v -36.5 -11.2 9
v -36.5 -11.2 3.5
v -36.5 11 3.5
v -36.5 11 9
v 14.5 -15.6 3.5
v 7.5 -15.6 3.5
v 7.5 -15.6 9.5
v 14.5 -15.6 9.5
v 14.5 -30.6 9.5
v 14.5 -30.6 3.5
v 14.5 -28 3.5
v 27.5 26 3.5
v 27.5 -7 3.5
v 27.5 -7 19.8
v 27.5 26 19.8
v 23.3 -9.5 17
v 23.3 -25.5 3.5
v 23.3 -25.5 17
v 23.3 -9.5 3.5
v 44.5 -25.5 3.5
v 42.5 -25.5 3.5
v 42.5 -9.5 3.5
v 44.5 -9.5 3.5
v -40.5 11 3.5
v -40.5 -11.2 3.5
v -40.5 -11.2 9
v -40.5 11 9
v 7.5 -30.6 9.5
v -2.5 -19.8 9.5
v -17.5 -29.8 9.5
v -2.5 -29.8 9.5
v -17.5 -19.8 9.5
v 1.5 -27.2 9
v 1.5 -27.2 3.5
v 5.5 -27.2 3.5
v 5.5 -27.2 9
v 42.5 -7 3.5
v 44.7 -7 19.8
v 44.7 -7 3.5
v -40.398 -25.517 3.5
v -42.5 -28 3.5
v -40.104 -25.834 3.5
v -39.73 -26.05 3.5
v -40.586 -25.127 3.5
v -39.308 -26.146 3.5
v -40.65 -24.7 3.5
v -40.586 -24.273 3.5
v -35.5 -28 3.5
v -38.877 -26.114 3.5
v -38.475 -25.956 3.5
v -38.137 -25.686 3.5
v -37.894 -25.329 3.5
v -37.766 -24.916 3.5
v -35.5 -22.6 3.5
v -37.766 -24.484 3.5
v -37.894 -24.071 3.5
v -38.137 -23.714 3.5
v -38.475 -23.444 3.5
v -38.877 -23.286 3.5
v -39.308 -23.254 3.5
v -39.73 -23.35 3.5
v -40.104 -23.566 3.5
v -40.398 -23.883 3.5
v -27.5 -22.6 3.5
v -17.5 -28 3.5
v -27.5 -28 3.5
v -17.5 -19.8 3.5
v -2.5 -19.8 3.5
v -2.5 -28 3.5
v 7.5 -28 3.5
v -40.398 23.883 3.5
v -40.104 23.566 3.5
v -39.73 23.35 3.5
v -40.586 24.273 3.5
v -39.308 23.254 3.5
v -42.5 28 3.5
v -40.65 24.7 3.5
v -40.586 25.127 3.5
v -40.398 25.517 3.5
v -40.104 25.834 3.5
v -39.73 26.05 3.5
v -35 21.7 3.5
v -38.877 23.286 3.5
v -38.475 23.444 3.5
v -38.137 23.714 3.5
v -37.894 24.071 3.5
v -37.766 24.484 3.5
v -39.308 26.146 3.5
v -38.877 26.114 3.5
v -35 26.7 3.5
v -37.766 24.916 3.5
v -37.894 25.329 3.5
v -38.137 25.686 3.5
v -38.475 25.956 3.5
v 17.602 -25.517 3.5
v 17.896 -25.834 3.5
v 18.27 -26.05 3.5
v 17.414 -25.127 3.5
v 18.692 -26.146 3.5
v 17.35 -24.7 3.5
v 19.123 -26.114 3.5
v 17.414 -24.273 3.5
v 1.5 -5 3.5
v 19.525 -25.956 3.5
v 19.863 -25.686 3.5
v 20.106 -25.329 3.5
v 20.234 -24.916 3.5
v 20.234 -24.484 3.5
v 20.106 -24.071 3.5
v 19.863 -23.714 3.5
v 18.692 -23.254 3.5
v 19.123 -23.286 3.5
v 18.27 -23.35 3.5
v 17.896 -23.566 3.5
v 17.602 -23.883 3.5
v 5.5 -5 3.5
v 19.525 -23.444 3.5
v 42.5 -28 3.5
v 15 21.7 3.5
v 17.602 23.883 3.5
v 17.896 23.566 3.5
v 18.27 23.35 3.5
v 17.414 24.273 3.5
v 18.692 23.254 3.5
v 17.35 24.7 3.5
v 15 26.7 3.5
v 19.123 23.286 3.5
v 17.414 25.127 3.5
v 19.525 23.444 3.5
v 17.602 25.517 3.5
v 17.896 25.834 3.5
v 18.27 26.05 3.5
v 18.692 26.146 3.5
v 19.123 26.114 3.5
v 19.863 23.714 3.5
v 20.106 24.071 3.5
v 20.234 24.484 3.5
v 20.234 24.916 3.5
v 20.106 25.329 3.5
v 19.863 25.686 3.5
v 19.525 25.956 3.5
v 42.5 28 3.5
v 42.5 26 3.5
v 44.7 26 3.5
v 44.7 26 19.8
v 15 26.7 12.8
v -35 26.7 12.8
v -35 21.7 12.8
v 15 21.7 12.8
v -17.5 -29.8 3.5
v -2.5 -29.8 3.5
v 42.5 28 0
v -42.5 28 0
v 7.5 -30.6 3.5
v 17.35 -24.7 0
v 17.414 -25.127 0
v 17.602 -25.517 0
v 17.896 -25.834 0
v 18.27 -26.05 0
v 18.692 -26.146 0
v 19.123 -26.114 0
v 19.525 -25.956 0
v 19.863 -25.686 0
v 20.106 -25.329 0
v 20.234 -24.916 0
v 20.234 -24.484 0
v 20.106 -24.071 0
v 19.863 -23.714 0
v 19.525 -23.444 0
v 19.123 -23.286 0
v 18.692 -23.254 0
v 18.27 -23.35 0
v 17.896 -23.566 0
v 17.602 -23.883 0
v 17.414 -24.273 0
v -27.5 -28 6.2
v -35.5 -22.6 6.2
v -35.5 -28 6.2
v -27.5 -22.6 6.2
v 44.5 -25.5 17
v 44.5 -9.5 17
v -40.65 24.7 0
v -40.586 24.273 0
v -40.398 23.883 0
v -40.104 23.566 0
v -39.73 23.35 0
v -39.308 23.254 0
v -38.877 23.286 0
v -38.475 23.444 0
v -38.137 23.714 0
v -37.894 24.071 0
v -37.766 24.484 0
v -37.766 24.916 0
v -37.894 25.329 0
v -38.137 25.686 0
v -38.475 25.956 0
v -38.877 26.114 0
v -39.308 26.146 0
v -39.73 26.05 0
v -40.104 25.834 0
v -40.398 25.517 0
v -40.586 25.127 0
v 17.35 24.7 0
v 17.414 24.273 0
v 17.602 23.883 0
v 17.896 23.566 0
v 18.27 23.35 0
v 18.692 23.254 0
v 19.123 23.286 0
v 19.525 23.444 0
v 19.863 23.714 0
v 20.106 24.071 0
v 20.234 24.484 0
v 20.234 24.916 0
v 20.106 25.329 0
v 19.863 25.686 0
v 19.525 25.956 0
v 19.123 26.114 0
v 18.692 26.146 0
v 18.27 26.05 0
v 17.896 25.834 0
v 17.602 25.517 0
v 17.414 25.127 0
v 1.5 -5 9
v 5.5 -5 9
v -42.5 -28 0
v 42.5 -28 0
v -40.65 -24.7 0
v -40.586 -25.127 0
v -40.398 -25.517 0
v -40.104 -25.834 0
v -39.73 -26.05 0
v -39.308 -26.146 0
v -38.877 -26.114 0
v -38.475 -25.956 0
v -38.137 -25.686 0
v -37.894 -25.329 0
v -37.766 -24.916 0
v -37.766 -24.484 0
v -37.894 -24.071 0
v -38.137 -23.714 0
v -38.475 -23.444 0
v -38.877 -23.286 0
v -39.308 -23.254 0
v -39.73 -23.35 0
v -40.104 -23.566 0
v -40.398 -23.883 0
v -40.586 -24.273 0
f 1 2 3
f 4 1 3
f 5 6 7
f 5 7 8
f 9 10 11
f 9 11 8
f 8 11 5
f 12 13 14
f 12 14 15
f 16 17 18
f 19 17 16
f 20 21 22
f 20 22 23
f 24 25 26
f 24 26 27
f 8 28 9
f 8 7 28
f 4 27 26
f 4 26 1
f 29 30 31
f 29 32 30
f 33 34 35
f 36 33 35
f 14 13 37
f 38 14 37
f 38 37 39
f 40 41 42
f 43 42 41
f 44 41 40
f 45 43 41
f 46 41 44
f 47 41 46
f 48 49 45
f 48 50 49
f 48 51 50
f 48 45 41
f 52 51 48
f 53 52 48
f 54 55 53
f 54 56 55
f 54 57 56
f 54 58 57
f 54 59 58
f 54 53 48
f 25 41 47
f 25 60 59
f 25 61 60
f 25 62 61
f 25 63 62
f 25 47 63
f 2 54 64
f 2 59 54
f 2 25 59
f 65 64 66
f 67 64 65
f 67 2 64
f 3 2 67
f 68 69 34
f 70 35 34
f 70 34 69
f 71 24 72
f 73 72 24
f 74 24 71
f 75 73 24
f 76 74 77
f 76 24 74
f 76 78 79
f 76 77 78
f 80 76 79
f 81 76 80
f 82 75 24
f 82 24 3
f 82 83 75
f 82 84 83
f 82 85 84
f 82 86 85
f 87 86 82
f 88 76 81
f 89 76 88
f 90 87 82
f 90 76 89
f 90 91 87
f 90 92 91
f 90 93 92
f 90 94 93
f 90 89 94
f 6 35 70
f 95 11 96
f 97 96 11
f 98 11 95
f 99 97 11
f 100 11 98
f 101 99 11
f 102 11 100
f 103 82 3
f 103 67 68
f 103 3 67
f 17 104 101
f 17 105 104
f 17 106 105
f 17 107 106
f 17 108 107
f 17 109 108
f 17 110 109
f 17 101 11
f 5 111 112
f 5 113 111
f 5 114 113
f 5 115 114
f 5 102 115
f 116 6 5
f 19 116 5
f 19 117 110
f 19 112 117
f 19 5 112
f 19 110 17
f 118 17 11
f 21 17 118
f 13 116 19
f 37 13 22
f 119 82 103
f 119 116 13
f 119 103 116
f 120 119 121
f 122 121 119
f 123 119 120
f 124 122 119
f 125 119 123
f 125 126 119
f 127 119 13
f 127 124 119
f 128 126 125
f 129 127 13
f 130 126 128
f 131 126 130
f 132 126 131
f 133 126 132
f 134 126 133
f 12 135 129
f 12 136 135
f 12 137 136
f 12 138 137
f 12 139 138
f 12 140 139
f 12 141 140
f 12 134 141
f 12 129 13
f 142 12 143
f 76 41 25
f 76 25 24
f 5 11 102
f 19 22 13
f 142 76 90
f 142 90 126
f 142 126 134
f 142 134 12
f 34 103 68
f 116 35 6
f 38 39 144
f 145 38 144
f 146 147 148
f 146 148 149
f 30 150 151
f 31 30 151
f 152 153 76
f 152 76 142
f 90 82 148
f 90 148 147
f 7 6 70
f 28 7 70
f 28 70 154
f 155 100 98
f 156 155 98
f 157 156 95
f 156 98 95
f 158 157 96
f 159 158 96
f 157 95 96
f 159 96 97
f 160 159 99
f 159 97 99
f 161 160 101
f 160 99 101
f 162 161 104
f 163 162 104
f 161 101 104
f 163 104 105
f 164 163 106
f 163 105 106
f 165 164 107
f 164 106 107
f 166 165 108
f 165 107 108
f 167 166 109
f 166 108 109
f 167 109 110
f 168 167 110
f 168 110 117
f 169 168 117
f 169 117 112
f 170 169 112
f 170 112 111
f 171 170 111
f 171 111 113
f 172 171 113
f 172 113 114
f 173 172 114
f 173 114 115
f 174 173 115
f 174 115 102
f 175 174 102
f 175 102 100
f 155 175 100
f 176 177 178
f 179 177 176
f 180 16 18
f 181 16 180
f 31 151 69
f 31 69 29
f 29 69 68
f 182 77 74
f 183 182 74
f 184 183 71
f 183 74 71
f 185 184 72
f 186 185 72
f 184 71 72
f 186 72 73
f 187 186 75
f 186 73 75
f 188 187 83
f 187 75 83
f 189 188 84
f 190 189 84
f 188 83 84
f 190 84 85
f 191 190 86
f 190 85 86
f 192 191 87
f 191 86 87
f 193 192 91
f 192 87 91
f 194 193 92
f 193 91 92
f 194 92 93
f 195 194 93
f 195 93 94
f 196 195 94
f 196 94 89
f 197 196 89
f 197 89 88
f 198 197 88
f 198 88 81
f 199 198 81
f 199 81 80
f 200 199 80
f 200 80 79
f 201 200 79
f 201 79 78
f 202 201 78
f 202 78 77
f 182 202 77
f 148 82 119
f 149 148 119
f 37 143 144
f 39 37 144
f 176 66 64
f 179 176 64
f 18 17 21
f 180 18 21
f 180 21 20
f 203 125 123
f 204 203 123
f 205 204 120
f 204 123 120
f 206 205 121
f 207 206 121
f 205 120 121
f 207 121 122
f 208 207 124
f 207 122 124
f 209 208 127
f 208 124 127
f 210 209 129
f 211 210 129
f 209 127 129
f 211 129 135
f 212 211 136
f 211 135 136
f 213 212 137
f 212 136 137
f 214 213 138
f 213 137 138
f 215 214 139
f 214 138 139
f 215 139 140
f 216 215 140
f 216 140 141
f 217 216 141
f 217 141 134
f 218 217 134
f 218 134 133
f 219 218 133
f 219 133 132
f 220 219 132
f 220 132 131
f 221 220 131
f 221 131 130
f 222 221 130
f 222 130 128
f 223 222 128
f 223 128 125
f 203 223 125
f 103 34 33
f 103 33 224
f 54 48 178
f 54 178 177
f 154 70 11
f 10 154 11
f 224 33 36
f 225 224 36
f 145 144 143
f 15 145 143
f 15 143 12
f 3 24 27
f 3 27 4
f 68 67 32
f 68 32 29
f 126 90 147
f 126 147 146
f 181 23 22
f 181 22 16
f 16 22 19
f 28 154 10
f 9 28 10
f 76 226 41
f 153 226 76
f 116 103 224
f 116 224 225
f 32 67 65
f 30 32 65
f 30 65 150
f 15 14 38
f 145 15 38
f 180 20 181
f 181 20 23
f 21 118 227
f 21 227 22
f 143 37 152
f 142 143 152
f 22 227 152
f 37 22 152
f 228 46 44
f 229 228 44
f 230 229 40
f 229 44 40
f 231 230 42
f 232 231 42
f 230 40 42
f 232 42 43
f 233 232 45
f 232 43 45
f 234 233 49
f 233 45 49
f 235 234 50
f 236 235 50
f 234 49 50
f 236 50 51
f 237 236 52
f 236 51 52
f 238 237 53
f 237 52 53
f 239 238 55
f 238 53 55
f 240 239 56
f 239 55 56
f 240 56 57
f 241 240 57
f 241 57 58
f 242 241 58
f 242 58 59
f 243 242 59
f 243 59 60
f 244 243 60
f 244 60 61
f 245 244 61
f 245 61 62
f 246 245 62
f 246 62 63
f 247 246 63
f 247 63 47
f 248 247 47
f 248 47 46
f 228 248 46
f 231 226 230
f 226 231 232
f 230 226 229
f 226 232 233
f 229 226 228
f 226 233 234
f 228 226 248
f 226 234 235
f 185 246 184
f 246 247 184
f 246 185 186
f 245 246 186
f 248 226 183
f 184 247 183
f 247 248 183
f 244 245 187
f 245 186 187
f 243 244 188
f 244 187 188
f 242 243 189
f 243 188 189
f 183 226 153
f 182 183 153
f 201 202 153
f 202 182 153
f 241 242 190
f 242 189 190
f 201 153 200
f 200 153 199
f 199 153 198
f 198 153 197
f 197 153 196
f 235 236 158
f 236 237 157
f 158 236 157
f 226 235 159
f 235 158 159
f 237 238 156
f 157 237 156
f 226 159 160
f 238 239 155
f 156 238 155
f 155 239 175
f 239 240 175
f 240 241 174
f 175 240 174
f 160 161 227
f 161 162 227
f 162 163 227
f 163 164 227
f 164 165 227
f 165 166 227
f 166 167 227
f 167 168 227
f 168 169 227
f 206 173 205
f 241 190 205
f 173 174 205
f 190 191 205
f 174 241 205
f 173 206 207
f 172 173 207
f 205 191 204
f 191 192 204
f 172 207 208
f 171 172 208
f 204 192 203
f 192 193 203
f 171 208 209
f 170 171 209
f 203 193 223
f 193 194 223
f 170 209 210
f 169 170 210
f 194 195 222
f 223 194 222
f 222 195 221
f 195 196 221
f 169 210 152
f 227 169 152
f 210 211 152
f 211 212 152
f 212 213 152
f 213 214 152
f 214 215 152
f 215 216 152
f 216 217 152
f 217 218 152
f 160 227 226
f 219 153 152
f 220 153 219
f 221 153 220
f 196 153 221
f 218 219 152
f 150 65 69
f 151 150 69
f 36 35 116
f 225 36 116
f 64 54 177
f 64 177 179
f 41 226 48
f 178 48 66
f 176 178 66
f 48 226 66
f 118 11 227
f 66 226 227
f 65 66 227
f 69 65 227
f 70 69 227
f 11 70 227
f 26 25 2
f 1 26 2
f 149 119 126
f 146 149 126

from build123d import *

# Parameters (mm, degrees)
F0_W     = 85
F0_H     = 56
F1_DEPTH = 3.5
F2_W     = 50
F2_H     = 5
F3_DEPTH = 9.3
F2_W_2   = 4
F2_H_2   = 22.2
F4_DEPTH = 5.5
F2_W_3   = 8
F2_H_3   = 5.4
F5_DEPTH = 2.7
F2_W_4   = 15
F2_H_4   = 1.8
F2_H_5   = 8.2
F6_DEPTH = 6
F2_W_5   = 7
F2_H_6   = 2.6
F2_H_7   = 12.4
F7_DEPTH = 6
F2_H_8   = 33
F2_W_6   = 2.2
F8_DEPTH = 16.3
F2_W_7   = 19.2
F2_H_9   = 16
F2_W_8   = 2
F9_DEPTH = 13.5
F10_D    = 2.9


with BuildPart() as f1:
    # F0 (on Top) → F1 (new body)
    with BuildSketch(Plane.XY):
        Rectangle(F0_W, F0_H)
    extrude(amount=F1_DEPTH)

    # F2 (on face) → F3 (join)
    with BuildSketch(Plane.XY.offset(3.5)):
        with Locations((-10, 24.2)):
            Rectangle(F2_W, F2_H)
    extrude(amount=F3_DEPTH)

    # F2 (on face) → F4 (join)
    with BuildSketch(Plane.XY.offset(3.5)):
        with Locations((-38.5, -0.1)):
            Rectangle(F2_W_2, F2_H_2)
        with Locations((3.5, -16.1)):
            Rectangle(F2_W_2, F2_H_2)
    extrude(amount=F4_DEPTH)

    # F2 (on face) → F5 (join)
    with BuildSketch(Plane.XY.offset(3.5)):
        with Locations((-31.5, -25.3)):
            Rectangle(F2_W_3, F2_H_3)
    extrude(amount=F5_DEPTH)

    # F2 (on face) → F6 (join)
    with BuildSketch(Plane.XY.offset(3.5)):
        with Locations((-10, -28.9)):
            Rectangle(F2_W_4, F2_H_4)
        with Locations((-10, -23.9)):
            Rectangle(F2_W_4, F2_H_5)
    extrude(amount=F6_DEPTH)

    # F2 (on face) → F7 (join)
    with BuildSketch(Plane.XY.offset(3.5)):
        with Locations((11, -29.3)):
            Rectangle(F2_W_5, F2_H_6)
        with Locations((11, -21.8)):
            Rectangle(F2_W_5, F2_H_7)
    extrude(amount=F7_DEPTH)

    # F2 (on face) → F8 (join)
    with BuildSketch(Plane.XY.offset(3.5)):
        with Locations((35, 9.5)):
            Rectangle(F2_W_4, F2_H_8)
        with Locations((43.6, 9.5)):
            Rectangle(F2_W_6, F2_H_8)
    extrude(amount=F8_DEPTH)

    # F2 (on face) → F9 (join)
    with BuildSketch(Plane.XY.offset(3.5)):
        with Locations((32.9, -17.5)):
            Rectangle(F2_W_7, F2_H_9)
        with Locations((43.5, -17.5)):
            Rectangle(F2_W_8, F2_H_9)
    extrude(amount=F9_DEPTH)

    # F10 (through all)
    with Locations(Plane(origin=(0, 0, 0), x_dir=(1, 0, 0), z_dir=(0, 0, -1))):
        with Locations((18.8, 24.7), (-39.2, 24.7), (-39.2, -24.7), (18.8, -24.7)):
            Hole(F10_D / 2)


solid = f1.part
